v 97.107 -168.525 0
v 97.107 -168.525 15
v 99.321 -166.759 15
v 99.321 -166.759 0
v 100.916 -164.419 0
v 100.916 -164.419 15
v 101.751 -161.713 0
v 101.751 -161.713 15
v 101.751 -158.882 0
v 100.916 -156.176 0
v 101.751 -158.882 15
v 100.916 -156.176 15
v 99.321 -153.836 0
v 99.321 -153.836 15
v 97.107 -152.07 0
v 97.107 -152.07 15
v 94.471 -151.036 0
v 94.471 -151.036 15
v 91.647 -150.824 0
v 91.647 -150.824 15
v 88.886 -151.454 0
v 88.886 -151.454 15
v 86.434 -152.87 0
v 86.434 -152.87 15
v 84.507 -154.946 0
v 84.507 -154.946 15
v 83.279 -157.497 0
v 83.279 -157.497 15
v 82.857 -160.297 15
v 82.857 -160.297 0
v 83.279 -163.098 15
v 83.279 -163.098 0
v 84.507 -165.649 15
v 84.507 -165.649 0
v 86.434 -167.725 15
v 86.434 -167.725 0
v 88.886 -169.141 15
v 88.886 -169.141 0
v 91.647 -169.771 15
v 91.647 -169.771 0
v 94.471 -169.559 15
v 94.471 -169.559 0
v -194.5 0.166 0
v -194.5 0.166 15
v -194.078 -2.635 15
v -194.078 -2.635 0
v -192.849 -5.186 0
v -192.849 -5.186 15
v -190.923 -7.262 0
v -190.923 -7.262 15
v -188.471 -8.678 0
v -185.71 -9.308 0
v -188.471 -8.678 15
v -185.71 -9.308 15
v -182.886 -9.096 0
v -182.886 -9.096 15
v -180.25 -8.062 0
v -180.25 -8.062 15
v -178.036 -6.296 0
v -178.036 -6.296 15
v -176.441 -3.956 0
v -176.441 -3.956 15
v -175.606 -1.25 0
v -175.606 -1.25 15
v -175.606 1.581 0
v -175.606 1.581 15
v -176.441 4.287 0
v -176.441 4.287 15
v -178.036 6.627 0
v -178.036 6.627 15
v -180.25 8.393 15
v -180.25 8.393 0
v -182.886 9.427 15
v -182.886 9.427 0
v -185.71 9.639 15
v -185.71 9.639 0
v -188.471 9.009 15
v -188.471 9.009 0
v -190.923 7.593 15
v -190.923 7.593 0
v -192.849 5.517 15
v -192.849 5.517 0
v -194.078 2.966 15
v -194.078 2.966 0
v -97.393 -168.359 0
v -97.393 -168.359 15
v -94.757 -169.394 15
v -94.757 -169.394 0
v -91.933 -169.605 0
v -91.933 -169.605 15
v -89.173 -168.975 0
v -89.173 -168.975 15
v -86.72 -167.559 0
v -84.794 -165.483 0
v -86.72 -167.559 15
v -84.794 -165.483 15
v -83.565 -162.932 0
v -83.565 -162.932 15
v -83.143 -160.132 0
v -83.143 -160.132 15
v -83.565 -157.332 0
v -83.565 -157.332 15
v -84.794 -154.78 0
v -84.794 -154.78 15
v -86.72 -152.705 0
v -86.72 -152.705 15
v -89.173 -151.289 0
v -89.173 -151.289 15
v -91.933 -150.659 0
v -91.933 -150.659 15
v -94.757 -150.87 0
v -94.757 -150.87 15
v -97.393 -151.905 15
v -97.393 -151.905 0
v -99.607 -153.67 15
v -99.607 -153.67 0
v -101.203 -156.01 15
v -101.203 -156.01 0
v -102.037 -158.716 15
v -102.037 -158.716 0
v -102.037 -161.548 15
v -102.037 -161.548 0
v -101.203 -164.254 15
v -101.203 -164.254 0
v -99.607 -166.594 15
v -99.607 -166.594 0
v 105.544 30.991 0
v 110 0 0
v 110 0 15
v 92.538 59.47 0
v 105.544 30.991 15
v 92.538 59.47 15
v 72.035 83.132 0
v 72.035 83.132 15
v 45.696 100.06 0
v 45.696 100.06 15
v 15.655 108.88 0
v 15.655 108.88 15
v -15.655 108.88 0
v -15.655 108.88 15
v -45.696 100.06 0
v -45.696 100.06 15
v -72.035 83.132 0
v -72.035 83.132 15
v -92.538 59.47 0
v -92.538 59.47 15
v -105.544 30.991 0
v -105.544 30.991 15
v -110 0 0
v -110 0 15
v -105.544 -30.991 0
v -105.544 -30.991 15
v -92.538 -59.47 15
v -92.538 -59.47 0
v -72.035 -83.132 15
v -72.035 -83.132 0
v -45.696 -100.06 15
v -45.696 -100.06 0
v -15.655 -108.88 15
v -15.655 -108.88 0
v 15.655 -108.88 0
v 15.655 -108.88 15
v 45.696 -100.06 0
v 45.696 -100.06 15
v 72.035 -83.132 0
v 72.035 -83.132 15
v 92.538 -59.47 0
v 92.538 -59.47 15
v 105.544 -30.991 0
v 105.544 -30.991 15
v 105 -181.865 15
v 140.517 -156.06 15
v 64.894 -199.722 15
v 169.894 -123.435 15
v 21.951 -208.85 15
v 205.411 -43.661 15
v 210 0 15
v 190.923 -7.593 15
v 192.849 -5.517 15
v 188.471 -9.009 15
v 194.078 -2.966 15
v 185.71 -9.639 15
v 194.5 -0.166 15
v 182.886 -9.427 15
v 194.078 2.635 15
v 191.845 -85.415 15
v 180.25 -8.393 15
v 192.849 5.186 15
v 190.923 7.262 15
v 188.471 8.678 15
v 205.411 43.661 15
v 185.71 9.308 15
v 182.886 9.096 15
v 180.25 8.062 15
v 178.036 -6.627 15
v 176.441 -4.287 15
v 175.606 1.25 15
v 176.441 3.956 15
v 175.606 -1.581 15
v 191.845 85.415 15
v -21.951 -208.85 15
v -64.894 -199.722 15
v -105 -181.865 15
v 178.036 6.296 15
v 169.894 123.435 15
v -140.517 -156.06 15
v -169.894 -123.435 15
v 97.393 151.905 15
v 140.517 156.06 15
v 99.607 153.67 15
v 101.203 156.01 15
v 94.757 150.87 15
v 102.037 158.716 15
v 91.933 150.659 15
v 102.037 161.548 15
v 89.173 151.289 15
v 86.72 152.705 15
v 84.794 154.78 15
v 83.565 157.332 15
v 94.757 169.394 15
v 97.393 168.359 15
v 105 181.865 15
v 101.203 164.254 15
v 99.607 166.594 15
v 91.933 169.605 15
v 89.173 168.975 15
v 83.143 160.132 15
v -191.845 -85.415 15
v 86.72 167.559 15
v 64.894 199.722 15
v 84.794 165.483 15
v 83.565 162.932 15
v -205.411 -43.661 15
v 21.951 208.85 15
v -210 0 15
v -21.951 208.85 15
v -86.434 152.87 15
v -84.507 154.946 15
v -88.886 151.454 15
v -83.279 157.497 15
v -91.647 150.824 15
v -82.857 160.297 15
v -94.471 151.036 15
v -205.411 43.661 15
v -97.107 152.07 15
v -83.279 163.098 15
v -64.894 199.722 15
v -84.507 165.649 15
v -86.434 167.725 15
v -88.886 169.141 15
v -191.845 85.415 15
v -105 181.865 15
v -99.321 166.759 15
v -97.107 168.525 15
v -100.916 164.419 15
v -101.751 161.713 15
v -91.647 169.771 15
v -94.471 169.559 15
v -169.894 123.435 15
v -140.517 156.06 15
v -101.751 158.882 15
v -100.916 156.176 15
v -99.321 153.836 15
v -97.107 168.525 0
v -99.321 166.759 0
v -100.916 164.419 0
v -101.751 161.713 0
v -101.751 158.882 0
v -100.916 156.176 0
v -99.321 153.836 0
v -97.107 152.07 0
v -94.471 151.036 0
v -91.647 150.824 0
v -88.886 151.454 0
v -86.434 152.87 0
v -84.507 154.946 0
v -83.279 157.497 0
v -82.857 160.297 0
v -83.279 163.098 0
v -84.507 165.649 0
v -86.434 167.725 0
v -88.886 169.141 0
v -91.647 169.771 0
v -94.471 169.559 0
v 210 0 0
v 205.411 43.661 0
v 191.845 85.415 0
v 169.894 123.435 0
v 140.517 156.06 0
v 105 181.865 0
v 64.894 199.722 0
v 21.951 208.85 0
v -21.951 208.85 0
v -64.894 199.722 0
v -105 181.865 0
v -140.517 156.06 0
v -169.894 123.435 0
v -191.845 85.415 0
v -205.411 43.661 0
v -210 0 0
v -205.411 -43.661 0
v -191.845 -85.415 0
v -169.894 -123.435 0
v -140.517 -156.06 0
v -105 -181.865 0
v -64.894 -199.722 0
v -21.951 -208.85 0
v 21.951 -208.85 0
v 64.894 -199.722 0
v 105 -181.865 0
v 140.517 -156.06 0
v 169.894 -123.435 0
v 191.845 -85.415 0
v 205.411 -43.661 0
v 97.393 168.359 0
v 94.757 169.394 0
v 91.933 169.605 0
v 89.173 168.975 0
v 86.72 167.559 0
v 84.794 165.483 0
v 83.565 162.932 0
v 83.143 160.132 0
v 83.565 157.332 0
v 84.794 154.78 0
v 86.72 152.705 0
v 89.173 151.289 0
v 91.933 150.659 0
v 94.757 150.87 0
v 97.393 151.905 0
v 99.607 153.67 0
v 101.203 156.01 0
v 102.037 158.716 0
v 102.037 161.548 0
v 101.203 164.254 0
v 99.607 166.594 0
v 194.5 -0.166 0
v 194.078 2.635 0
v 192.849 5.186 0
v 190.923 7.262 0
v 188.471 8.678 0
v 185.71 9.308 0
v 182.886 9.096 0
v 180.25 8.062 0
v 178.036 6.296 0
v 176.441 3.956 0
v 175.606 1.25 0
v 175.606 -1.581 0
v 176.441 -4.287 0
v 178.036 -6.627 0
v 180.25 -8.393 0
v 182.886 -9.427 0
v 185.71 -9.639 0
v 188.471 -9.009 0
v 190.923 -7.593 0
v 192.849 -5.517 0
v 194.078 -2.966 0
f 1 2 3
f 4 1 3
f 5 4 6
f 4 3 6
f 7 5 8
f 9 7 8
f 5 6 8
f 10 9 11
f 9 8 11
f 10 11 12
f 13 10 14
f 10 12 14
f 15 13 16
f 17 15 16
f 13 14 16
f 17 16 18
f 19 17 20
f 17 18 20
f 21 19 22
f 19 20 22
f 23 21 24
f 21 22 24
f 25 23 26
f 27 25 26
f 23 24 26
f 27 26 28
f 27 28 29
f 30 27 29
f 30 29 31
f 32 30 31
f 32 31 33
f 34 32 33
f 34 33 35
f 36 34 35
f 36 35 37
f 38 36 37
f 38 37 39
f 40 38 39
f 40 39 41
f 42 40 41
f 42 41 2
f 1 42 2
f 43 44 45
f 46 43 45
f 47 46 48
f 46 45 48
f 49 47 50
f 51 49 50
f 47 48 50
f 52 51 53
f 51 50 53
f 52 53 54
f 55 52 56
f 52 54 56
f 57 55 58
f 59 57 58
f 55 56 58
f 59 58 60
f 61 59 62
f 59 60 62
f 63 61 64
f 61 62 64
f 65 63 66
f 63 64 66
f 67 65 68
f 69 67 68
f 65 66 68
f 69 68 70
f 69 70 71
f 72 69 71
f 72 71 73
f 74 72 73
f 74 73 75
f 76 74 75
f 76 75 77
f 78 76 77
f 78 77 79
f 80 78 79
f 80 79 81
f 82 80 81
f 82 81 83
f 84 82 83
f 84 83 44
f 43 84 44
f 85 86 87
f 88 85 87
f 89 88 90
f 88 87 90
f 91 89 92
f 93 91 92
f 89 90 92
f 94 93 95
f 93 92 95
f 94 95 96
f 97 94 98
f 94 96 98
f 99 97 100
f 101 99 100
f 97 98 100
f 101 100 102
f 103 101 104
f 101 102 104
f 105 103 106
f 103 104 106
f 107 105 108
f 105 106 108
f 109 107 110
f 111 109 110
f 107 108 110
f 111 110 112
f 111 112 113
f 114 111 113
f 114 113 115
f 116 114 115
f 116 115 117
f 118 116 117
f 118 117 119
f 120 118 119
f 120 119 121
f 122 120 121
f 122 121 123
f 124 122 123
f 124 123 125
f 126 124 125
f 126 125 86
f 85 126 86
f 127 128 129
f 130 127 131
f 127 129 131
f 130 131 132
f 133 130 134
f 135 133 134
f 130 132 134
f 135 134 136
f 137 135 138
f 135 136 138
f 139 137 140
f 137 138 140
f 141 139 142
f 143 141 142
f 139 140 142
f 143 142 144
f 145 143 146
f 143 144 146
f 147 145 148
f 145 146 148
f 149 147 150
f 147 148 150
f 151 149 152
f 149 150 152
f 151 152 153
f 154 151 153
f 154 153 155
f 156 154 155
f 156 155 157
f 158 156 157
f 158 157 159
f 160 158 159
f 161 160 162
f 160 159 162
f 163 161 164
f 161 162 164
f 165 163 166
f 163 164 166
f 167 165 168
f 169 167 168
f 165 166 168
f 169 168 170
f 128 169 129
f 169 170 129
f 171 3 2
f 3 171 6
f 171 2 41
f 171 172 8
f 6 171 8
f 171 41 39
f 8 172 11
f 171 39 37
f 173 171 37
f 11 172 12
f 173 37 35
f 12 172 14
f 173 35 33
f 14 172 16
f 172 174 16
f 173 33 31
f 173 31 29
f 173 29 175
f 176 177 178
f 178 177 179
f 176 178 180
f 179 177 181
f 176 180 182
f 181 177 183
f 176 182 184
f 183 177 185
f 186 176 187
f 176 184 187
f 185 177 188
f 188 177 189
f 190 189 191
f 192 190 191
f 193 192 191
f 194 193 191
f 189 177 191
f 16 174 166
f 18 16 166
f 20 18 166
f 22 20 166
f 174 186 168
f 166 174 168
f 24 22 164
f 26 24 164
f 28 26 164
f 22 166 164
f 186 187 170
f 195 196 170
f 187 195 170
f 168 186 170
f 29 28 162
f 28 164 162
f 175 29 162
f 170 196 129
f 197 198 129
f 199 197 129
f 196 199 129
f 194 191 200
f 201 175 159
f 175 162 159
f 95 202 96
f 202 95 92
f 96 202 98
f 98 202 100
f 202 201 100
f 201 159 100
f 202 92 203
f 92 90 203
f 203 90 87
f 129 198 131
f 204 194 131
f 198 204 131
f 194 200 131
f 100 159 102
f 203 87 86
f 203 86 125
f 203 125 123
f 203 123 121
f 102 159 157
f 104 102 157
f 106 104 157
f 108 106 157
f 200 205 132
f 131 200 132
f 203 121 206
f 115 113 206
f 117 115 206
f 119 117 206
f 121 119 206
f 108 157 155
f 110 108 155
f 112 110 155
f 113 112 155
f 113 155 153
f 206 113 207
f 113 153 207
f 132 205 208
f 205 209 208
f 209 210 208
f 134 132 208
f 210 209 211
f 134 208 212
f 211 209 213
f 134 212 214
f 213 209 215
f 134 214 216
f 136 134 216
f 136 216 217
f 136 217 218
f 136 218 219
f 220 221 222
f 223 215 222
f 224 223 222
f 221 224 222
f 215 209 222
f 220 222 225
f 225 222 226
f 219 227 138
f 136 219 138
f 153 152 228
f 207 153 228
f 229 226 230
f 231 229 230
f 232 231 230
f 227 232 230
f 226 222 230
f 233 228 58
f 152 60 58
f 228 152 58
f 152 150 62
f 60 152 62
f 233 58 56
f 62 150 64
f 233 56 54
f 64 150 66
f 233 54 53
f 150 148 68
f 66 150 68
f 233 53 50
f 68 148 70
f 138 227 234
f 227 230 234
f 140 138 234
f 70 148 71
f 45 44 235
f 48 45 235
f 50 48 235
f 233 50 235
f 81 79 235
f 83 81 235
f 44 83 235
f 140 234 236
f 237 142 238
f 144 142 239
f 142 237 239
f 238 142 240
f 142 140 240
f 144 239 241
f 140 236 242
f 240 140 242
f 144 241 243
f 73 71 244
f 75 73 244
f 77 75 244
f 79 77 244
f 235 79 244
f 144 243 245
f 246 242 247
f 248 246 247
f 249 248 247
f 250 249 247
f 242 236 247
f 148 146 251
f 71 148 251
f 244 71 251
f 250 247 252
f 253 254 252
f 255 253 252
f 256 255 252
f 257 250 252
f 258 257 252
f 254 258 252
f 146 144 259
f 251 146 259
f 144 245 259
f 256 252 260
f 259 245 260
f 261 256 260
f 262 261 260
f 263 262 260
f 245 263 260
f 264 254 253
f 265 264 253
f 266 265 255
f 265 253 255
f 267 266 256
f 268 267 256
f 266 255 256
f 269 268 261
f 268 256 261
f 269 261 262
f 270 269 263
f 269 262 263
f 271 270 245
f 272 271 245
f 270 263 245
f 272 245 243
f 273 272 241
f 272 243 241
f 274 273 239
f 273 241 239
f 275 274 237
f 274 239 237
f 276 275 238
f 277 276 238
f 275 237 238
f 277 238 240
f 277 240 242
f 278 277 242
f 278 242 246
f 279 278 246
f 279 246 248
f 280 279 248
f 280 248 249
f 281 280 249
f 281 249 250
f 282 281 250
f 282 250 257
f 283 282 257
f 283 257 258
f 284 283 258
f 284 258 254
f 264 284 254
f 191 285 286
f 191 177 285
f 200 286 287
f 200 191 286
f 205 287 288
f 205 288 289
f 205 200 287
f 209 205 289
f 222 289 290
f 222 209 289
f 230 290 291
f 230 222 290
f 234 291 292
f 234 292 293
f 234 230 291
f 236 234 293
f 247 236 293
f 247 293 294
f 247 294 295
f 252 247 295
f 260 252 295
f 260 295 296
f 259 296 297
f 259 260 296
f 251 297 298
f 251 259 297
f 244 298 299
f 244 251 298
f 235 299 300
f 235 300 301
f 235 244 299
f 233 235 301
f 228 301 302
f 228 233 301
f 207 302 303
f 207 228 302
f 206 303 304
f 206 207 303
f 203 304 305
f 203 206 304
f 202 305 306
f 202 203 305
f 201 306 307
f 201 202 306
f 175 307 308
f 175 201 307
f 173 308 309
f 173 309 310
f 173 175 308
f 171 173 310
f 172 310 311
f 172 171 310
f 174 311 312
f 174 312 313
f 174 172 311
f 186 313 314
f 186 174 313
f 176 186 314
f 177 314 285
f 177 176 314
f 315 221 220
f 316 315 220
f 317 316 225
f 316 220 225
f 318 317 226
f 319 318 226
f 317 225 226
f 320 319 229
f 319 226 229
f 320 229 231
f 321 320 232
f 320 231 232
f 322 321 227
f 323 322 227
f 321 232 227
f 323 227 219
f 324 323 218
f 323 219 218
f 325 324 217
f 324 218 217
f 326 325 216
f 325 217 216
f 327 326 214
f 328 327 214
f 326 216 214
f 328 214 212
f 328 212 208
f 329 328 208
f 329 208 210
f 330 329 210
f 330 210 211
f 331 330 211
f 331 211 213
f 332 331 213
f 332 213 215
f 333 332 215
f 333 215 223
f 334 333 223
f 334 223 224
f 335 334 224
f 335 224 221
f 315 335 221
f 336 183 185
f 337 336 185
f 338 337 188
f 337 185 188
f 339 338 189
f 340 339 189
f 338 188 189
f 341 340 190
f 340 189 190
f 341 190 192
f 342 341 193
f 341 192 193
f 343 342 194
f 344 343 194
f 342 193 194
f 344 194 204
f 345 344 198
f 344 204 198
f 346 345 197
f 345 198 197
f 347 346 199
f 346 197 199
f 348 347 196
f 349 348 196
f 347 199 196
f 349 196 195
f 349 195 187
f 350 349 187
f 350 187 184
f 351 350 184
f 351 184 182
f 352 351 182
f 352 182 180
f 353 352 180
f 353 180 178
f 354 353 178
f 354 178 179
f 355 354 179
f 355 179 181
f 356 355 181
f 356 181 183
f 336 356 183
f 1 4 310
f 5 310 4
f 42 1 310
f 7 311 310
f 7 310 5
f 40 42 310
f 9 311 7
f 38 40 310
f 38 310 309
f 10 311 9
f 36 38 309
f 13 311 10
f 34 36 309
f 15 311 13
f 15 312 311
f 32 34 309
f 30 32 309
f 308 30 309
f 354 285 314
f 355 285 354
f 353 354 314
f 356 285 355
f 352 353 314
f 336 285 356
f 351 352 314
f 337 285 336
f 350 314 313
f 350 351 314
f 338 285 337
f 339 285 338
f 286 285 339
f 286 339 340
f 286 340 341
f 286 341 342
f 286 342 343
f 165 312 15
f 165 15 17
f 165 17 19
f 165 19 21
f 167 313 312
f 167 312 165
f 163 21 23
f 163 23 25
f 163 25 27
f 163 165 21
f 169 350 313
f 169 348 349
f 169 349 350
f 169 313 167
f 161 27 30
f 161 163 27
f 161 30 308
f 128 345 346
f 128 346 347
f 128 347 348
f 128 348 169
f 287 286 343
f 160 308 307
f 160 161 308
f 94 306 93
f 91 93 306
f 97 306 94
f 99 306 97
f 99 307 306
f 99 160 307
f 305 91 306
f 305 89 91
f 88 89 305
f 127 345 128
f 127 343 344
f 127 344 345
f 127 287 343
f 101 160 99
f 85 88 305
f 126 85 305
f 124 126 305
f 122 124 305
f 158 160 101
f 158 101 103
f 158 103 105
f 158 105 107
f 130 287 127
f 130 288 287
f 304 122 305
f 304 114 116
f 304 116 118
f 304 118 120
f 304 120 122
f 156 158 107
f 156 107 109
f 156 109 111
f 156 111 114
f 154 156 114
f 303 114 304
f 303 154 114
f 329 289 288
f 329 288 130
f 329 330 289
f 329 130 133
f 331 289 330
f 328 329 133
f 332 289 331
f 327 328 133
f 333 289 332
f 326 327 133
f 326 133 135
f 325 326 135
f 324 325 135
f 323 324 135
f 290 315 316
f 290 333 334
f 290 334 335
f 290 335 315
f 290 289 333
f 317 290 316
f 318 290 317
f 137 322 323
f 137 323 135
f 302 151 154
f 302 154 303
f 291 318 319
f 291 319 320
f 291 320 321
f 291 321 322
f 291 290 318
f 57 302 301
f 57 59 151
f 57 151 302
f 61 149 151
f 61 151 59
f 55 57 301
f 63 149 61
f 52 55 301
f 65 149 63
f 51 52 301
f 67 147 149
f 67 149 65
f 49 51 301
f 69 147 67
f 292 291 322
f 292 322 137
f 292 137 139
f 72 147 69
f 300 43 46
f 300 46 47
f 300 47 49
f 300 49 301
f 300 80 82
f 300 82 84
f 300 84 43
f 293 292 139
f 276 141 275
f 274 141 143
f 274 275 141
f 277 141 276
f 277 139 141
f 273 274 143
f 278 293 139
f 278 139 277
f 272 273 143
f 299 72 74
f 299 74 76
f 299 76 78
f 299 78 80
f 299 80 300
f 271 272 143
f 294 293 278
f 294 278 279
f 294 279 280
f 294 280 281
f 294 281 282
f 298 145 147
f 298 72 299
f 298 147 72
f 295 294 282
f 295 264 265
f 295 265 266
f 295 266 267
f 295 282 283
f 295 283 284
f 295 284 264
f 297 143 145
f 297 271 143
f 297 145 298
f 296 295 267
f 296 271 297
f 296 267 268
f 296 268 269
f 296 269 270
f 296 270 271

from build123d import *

# Parameters (mm, degrees)
SKETCH010_R      = 9.5
EXTRUDE004_DEPTH = 30
ARRAY003_COUNT   = 6
SKETCH005_W      = 100
SKETCH005_H      = 15


with BuildPart() as array003:
    # Sketch010 (on Face3 of Revolve) → Extrude004 (new body)
    with BuildSketch(Plane.XY.offset(15)):
        with Locations((185, -0.1655)):
            Circle(SKETCH010_R)
    extrude(amount=-EXTRUDE004_DEPTH)

    # Array003: Array003 ×6 about axis
    array003_axis = Axis((0, 0, 590.09), (0, 0, 1))


with BuildPart() as array003_1:
    add(array003.part)
    for i in range(1, ARRAY003_COUNT):
        add(array003.part.rotate(array003_axis, i * 360 / ARRAY003_COUNT))


with BuildPart() as cut005:
    # Sketch005 → Revolve (revolve)
    with BuildSketch(Plane.XZ):
        with Locations((160, 7.5)):
            Rectangle(SKETCH005_W, SKETCH005_H)
    revolve(axis=Axis((0, 0, 0), (0, 0, 1)))

    # Cut005: cut Array003
    add(array003_1.part, mode=Mode.SUBTRACT)


solid = cut005.part
